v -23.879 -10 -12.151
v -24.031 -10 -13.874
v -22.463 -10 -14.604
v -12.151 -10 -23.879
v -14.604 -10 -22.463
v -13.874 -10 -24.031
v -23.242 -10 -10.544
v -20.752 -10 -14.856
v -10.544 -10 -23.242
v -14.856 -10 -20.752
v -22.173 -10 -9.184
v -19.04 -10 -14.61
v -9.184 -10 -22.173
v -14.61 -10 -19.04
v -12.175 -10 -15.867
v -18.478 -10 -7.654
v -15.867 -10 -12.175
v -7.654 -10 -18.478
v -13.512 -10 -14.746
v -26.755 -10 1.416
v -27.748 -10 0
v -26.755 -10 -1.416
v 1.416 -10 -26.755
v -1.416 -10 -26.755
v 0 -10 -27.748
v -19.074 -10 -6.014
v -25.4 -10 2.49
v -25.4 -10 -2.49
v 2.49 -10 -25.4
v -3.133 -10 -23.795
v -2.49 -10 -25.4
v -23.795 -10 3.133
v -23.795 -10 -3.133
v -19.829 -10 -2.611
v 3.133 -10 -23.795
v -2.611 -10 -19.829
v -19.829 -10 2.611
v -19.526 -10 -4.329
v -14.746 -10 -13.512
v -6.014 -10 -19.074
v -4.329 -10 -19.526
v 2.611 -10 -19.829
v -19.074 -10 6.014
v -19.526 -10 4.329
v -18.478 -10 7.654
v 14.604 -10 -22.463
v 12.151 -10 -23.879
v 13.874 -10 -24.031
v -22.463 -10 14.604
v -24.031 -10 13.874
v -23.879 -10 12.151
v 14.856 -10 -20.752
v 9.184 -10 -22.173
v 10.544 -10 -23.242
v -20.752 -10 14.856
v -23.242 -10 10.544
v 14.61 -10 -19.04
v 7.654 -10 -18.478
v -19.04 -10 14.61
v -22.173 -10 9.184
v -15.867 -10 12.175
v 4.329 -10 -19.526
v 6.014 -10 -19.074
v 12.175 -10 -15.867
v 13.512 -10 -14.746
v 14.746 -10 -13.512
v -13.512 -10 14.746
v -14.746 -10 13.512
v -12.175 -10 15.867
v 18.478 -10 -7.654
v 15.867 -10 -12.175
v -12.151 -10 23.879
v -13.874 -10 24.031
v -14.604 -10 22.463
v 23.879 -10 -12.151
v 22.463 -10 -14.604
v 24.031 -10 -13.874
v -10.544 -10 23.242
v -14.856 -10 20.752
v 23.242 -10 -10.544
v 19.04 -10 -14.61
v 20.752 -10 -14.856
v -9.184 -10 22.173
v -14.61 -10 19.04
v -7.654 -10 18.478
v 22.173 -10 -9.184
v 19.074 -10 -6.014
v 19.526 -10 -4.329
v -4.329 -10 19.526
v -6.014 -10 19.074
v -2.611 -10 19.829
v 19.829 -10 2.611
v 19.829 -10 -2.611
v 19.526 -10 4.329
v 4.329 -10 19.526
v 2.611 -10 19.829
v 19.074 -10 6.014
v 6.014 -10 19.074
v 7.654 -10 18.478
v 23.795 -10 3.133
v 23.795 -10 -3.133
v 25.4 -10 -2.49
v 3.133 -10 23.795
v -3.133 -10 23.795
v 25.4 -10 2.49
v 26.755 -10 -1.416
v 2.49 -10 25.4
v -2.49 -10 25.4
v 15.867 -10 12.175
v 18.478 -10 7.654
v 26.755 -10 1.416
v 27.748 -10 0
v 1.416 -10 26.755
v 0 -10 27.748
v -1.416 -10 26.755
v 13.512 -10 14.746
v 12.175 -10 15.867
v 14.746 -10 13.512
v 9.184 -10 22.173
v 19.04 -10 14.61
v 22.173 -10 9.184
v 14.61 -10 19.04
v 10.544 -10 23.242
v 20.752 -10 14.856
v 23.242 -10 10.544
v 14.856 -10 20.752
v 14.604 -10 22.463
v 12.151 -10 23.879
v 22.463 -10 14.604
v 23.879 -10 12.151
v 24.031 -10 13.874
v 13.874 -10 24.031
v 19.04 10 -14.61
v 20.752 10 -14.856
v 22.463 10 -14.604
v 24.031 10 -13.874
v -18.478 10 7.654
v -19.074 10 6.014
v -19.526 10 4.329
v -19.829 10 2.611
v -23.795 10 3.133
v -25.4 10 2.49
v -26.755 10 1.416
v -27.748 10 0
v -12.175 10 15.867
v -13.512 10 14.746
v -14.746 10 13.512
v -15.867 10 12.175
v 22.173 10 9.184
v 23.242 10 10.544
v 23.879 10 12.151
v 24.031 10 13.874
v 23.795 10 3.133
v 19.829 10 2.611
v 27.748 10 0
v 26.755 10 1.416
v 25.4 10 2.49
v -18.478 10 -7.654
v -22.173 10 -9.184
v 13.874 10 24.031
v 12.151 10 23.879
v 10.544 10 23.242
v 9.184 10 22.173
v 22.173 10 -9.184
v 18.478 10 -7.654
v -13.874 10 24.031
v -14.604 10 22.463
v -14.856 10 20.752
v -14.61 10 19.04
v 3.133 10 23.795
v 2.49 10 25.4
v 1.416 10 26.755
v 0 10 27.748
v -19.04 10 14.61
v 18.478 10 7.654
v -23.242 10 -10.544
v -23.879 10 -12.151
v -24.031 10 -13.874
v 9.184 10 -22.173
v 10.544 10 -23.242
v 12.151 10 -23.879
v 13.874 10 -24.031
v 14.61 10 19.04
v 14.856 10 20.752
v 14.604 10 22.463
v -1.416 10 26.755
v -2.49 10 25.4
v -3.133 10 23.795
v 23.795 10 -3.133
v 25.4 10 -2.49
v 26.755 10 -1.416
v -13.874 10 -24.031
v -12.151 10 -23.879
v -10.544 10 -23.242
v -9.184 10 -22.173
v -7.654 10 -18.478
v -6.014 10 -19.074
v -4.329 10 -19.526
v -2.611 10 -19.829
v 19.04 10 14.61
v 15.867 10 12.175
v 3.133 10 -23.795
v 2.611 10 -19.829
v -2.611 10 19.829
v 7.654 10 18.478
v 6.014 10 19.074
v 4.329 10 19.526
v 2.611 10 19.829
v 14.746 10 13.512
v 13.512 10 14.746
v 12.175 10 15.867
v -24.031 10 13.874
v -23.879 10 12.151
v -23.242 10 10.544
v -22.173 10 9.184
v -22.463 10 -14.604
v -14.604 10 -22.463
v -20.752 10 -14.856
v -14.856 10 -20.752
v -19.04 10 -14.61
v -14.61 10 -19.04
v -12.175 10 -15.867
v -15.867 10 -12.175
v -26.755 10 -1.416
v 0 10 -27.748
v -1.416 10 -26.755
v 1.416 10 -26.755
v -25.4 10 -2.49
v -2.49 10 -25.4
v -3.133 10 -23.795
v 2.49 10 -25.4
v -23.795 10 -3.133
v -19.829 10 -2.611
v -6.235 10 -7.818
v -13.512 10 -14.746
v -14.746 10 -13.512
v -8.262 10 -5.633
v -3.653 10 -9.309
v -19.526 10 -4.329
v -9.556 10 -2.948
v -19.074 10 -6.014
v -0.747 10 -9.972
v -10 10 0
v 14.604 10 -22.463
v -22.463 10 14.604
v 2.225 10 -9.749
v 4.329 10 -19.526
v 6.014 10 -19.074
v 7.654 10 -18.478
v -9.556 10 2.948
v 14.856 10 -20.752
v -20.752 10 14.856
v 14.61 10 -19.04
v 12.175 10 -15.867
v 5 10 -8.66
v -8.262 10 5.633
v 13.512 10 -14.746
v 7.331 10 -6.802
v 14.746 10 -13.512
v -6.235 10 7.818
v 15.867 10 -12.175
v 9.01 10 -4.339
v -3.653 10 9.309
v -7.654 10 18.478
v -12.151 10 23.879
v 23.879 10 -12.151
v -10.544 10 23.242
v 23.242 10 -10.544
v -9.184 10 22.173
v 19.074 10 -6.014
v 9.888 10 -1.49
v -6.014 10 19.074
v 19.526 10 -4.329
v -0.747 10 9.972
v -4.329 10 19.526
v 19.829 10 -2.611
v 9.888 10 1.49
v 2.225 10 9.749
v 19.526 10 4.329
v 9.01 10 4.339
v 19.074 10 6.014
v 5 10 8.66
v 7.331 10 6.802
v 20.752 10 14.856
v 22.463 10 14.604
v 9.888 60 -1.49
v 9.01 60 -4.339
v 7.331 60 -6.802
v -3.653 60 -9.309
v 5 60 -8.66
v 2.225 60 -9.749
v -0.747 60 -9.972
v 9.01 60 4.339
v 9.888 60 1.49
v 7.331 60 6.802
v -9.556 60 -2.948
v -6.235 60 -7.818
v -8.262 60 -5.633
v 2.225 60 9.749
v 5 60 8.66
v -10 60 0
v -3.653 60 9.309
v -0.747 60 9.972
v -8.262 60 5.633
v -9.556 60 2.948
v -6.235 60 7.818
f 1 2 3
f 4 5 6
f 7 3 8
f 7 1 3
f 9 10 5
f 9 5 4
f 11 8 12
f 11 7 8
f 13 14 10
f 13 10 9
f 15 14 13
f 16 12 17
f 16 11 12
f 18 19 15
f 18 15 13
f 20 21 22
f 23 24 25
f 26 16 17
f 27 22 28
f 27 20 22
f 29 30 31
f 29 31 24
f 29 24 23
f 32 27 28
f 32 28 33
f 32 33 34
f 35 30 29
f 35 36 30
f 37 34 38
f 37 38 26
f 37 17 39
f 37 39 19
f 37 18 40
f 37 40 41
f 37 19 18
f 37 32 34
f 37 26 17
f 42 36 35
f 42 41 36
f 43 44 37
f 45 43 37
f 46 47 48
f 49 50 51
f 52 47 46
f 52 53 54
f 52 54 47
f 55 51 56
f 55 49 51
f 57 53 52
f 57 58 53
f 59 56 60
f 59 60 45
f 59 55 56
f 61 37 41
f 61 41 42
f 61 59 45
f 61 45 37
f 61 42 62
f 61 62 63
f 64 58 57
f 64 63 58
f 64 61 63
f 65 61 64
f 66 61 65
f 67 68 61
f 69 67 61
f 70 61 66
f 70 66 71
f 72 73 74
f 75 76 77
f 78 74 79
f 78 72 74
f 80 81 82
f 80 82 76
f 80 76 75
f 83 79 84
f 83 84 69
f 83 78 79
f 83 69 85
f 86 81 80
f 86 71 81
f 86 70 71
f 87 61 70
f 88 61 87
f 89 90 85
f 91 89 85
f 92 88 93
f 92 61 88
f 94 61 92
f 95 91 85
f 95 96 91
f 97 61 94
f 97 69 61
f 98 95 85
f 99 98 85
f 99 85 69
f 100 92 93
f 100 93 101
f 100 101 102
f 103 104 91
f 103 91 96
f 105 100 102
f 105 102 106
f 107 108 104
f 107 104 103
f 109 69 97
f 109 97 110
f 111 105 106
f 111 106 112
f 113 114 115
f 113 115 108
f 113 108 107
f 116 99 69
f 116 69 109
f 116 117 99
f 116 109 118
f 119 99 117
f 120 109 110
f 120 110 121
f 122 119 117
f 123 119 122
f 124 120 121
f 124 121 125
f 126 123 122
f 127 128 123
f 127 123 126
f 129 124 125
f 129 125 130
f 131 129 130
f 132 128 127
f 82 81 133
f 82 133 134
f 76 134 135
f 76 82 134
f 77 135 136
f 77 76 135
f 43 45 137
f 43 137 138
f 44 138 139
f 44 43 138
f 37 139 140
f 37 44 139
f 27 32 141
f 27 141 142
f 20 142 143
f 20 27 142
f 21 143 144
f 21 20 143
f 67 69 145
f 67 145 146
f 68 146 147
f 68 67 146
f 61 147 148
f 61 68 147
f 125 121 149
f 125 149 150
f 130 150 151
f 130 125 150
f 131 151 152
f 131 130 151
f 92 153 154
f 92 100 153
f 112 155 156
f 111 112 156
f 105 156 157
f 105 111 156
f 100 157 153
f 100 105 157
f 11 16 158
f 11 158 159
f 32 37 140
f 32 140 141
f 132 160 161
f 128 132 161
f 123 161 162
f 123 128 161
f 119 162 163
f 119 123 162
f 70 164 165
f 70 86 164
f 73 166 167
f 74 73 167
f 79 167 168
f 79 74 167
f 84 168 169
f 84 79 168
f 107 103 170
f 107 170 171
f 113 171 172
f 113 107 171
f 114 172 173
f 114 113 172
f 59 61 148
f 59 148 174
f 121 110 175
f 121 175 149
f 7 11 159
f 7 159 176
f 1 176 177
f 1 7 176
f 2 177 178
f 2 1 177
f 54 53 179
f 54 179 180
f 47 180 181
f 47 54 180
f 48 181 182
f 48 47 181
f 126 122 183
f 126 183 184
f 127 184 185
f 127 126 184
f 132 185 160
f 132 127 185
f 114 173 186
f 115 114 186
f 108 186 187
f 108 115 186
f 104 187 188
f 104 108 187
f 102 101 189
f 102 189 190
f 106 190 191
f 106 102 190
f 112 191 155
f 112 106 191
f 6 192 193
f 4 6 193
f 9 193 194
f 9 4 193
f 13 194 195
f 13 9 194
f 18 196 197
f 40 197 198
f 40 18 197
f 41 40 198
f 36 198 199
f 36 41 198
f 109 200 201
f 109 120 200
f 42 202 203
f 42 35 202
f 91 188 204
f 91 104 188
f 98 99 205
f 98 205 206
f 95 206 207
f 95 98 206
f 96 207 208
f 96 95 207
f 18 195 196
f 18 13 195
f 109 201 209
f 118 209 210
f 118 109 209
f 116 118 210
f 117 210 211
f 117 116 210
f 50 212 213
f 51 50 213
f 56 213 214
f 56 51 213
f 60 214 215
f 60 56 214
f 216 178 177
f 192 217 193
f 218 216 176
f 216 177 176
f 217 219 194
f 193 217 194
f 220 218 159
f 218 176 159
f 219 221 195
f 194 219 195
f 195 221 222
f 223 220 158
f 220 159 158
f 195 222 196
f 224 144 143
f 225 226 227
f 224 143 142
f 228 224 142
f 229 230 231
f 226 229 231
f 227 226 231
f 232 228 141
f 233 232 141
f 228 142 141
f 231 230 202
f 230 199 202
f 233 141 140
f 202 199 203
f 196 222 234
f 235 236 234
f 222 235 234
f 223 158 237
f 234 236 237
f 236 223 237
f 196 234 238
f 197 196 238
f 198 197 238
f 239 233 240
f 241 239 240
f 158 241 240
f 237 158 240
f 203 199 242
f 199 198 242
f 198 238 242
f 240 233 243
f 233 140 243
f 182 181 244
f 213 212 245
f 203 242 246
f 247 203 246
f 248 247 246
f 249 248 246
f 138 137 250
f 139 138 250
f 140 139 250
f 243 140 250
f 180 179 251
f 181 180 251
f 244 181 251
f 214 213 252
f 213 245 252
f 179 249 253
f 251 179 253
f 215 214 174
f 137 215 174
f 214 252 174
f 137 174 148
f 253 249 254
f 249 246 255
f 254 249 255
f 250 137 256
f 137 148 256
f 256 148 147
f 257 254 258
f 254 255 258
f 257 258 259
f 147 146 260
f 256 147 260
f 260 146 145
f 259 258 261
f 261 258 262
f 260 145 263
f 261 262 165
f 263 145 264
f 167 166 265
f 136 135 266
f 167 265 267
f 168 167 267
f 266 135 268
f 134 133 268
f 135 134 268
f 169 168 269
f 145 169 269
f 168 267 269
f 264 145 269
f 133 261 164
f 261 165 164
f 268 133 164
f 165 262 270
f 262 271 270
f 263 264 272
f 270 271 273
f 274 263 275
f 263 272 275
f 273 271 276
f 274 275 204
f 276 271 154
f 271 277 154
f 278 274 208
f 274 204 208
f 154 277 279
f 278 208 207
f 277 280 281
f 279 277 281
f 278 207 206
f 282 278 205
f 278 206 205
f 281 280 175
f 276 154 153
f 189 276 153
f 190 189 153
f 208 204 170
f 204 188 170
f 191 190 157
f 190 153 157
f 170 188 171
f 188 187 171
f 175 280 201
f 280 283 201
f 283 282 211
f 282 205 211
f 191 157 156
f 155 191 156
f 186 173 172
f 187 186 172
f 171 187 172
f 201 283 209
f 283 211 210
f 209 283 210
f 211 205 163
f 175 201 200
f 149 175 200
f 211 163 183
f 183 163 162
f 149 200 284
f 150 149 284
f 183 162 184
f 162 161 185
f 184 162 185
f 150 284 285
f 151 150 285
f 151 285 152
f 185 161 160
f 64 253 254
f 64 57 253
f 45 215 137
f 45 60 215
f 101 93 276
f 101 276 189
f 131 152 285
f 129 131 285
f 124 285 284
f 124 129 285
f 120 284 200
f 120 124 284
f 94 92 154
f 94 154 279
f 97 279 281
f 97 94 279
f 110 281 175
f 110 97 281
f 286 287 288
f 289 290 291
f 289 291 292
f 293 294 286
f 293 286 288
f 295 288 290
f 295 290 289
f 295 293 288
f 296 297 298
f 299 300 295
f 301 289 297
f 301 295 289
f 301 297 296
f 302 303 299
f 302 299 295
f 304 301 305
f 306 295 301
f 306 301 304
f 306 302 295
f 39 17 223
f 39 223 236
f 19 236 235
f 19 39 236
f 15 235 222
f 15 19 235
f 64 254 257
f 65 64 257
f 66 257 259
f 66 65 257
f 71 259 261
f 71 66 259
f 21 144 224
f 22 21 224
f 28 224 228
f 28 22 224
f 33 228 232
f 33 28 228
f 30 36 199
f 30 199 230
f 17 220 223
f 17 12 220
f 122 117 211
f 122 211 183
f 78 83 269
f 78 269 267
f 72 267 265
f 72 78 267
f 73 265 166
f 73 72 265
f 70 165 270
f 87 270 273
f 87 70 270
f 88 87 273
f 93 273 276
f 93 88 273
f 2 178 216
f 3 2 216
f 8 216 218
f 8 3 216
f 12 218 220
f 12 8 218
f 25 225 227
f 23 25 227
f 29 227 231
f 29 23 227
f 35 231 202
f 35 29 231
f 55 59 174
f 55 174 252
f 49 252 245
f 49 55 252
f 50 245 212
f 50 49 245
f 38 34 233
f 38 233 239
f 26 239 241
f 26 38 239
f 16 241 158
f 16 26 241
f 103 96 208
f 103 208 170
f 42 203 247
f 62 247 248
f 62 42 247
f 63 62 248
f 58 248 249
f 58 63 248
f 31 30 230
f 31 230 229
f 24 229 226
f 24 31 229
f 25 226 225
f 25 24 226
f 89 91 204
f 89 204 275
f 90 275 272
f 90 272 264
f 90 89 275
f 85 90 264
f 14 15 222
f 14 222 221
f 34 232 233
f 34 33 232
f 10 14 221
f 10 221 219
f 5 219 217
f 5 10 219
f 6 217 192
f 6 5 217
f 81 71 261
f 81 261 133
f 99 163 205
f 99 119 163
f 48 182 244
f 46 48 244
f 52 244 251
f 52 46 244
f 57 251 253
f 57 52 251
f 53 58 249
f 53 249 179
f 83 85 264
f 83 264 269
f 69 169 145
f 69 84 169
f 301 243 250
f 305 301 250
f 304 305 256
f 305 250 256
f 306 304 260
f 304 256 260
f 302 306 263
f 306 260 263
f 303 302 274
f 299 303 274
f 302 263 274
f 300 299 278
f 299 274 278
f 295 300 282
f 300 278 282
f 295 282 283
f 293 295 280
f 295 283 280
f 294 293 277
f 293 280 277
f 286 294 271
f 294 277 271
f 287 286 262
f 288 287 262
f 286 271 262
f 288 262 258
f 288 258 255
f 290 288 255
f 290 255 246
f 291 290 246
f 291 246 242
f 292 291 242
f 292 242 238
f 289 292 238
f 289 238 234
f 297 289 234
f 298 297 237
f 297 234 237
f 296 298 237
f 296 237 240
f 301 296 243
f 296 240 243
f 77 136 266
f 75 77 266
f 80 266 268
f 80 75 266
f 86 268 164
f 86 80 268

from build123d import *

# Parameters (mm, degrees)
F2_DEPTH        = 10
F2_COPIES_COUNT = 12
F4_R            = 10
F5_DEPTH        = 50


# Not quite as in the source:
# - a feature of the source that left no trace in its solid (it failed there, or was rolled back) is left out
# - a pattern or mirror of a feature is missing from the dataset's text; its kind, count and spacing are read off the source's solid


with BuildPart() as f2:
    # F1 (on Front) → F2 (new body, symmetric)
    with BuildSketch(Plane.XZ):
        with BuildLine():
            ThreePointArc((-2.6105238444, 19.8288972275), (-13.186916302, -15.0367961496), (20, 0))
            ThreePointArc((20, 0), (15.0367961496, 13.186916302), (2.6105238444, 19.8288972275))
            ThreePointArc((2.6105238444, 19.8288972275), (0, 20), (-2.6105238444, 19.8288972275))
        make_face()
        with BuildLine():
            ThreePointArc((-2.6105238444, 19.8288972275), (0, 20), (2.6105238444, 19.8288972275))
            Line((2.6105238444, 19.8288972275), (3.1326286133, 23.794676673))
            ThreePointArc((3.1326286133, 23.794676673), (2.0019466325, 26.1165955987), (0, 27.7481466766))
            ThreePointArc((0, 27.7481466766), (-2.0019466325, 26.1165955987), (-3.1326286133, 23.794676673))
            Line((-3.1326286133, 23.794676673), (-2.6105238444, 19.8288972275))
        make_face()
    extrude(amount=F2_DEPTH, both=True)

    # F2_copies: F2 ×12 about axis
    f2_copies_axis = Axis((0, 0, 0), (0, 1, 0))


with BuildPart() as f2_1:
    add(f2.part)
    for i in range(1, F2_COPIES_COUNT):
        add(f2.part.rotate(f2_copies_axis, i * 360 / F2_COPIES_COUNT))

    # F4 (on face) → F5 (join)
    with BuildSketch(Plane(origin=(0, 10, 0), x_dir=(-1, 0, 0), z_dir=(0, 1, 0))):
        Circle(F4_R)
    extrude(amount=F5_DEPTH)


solid = f2_1.part
